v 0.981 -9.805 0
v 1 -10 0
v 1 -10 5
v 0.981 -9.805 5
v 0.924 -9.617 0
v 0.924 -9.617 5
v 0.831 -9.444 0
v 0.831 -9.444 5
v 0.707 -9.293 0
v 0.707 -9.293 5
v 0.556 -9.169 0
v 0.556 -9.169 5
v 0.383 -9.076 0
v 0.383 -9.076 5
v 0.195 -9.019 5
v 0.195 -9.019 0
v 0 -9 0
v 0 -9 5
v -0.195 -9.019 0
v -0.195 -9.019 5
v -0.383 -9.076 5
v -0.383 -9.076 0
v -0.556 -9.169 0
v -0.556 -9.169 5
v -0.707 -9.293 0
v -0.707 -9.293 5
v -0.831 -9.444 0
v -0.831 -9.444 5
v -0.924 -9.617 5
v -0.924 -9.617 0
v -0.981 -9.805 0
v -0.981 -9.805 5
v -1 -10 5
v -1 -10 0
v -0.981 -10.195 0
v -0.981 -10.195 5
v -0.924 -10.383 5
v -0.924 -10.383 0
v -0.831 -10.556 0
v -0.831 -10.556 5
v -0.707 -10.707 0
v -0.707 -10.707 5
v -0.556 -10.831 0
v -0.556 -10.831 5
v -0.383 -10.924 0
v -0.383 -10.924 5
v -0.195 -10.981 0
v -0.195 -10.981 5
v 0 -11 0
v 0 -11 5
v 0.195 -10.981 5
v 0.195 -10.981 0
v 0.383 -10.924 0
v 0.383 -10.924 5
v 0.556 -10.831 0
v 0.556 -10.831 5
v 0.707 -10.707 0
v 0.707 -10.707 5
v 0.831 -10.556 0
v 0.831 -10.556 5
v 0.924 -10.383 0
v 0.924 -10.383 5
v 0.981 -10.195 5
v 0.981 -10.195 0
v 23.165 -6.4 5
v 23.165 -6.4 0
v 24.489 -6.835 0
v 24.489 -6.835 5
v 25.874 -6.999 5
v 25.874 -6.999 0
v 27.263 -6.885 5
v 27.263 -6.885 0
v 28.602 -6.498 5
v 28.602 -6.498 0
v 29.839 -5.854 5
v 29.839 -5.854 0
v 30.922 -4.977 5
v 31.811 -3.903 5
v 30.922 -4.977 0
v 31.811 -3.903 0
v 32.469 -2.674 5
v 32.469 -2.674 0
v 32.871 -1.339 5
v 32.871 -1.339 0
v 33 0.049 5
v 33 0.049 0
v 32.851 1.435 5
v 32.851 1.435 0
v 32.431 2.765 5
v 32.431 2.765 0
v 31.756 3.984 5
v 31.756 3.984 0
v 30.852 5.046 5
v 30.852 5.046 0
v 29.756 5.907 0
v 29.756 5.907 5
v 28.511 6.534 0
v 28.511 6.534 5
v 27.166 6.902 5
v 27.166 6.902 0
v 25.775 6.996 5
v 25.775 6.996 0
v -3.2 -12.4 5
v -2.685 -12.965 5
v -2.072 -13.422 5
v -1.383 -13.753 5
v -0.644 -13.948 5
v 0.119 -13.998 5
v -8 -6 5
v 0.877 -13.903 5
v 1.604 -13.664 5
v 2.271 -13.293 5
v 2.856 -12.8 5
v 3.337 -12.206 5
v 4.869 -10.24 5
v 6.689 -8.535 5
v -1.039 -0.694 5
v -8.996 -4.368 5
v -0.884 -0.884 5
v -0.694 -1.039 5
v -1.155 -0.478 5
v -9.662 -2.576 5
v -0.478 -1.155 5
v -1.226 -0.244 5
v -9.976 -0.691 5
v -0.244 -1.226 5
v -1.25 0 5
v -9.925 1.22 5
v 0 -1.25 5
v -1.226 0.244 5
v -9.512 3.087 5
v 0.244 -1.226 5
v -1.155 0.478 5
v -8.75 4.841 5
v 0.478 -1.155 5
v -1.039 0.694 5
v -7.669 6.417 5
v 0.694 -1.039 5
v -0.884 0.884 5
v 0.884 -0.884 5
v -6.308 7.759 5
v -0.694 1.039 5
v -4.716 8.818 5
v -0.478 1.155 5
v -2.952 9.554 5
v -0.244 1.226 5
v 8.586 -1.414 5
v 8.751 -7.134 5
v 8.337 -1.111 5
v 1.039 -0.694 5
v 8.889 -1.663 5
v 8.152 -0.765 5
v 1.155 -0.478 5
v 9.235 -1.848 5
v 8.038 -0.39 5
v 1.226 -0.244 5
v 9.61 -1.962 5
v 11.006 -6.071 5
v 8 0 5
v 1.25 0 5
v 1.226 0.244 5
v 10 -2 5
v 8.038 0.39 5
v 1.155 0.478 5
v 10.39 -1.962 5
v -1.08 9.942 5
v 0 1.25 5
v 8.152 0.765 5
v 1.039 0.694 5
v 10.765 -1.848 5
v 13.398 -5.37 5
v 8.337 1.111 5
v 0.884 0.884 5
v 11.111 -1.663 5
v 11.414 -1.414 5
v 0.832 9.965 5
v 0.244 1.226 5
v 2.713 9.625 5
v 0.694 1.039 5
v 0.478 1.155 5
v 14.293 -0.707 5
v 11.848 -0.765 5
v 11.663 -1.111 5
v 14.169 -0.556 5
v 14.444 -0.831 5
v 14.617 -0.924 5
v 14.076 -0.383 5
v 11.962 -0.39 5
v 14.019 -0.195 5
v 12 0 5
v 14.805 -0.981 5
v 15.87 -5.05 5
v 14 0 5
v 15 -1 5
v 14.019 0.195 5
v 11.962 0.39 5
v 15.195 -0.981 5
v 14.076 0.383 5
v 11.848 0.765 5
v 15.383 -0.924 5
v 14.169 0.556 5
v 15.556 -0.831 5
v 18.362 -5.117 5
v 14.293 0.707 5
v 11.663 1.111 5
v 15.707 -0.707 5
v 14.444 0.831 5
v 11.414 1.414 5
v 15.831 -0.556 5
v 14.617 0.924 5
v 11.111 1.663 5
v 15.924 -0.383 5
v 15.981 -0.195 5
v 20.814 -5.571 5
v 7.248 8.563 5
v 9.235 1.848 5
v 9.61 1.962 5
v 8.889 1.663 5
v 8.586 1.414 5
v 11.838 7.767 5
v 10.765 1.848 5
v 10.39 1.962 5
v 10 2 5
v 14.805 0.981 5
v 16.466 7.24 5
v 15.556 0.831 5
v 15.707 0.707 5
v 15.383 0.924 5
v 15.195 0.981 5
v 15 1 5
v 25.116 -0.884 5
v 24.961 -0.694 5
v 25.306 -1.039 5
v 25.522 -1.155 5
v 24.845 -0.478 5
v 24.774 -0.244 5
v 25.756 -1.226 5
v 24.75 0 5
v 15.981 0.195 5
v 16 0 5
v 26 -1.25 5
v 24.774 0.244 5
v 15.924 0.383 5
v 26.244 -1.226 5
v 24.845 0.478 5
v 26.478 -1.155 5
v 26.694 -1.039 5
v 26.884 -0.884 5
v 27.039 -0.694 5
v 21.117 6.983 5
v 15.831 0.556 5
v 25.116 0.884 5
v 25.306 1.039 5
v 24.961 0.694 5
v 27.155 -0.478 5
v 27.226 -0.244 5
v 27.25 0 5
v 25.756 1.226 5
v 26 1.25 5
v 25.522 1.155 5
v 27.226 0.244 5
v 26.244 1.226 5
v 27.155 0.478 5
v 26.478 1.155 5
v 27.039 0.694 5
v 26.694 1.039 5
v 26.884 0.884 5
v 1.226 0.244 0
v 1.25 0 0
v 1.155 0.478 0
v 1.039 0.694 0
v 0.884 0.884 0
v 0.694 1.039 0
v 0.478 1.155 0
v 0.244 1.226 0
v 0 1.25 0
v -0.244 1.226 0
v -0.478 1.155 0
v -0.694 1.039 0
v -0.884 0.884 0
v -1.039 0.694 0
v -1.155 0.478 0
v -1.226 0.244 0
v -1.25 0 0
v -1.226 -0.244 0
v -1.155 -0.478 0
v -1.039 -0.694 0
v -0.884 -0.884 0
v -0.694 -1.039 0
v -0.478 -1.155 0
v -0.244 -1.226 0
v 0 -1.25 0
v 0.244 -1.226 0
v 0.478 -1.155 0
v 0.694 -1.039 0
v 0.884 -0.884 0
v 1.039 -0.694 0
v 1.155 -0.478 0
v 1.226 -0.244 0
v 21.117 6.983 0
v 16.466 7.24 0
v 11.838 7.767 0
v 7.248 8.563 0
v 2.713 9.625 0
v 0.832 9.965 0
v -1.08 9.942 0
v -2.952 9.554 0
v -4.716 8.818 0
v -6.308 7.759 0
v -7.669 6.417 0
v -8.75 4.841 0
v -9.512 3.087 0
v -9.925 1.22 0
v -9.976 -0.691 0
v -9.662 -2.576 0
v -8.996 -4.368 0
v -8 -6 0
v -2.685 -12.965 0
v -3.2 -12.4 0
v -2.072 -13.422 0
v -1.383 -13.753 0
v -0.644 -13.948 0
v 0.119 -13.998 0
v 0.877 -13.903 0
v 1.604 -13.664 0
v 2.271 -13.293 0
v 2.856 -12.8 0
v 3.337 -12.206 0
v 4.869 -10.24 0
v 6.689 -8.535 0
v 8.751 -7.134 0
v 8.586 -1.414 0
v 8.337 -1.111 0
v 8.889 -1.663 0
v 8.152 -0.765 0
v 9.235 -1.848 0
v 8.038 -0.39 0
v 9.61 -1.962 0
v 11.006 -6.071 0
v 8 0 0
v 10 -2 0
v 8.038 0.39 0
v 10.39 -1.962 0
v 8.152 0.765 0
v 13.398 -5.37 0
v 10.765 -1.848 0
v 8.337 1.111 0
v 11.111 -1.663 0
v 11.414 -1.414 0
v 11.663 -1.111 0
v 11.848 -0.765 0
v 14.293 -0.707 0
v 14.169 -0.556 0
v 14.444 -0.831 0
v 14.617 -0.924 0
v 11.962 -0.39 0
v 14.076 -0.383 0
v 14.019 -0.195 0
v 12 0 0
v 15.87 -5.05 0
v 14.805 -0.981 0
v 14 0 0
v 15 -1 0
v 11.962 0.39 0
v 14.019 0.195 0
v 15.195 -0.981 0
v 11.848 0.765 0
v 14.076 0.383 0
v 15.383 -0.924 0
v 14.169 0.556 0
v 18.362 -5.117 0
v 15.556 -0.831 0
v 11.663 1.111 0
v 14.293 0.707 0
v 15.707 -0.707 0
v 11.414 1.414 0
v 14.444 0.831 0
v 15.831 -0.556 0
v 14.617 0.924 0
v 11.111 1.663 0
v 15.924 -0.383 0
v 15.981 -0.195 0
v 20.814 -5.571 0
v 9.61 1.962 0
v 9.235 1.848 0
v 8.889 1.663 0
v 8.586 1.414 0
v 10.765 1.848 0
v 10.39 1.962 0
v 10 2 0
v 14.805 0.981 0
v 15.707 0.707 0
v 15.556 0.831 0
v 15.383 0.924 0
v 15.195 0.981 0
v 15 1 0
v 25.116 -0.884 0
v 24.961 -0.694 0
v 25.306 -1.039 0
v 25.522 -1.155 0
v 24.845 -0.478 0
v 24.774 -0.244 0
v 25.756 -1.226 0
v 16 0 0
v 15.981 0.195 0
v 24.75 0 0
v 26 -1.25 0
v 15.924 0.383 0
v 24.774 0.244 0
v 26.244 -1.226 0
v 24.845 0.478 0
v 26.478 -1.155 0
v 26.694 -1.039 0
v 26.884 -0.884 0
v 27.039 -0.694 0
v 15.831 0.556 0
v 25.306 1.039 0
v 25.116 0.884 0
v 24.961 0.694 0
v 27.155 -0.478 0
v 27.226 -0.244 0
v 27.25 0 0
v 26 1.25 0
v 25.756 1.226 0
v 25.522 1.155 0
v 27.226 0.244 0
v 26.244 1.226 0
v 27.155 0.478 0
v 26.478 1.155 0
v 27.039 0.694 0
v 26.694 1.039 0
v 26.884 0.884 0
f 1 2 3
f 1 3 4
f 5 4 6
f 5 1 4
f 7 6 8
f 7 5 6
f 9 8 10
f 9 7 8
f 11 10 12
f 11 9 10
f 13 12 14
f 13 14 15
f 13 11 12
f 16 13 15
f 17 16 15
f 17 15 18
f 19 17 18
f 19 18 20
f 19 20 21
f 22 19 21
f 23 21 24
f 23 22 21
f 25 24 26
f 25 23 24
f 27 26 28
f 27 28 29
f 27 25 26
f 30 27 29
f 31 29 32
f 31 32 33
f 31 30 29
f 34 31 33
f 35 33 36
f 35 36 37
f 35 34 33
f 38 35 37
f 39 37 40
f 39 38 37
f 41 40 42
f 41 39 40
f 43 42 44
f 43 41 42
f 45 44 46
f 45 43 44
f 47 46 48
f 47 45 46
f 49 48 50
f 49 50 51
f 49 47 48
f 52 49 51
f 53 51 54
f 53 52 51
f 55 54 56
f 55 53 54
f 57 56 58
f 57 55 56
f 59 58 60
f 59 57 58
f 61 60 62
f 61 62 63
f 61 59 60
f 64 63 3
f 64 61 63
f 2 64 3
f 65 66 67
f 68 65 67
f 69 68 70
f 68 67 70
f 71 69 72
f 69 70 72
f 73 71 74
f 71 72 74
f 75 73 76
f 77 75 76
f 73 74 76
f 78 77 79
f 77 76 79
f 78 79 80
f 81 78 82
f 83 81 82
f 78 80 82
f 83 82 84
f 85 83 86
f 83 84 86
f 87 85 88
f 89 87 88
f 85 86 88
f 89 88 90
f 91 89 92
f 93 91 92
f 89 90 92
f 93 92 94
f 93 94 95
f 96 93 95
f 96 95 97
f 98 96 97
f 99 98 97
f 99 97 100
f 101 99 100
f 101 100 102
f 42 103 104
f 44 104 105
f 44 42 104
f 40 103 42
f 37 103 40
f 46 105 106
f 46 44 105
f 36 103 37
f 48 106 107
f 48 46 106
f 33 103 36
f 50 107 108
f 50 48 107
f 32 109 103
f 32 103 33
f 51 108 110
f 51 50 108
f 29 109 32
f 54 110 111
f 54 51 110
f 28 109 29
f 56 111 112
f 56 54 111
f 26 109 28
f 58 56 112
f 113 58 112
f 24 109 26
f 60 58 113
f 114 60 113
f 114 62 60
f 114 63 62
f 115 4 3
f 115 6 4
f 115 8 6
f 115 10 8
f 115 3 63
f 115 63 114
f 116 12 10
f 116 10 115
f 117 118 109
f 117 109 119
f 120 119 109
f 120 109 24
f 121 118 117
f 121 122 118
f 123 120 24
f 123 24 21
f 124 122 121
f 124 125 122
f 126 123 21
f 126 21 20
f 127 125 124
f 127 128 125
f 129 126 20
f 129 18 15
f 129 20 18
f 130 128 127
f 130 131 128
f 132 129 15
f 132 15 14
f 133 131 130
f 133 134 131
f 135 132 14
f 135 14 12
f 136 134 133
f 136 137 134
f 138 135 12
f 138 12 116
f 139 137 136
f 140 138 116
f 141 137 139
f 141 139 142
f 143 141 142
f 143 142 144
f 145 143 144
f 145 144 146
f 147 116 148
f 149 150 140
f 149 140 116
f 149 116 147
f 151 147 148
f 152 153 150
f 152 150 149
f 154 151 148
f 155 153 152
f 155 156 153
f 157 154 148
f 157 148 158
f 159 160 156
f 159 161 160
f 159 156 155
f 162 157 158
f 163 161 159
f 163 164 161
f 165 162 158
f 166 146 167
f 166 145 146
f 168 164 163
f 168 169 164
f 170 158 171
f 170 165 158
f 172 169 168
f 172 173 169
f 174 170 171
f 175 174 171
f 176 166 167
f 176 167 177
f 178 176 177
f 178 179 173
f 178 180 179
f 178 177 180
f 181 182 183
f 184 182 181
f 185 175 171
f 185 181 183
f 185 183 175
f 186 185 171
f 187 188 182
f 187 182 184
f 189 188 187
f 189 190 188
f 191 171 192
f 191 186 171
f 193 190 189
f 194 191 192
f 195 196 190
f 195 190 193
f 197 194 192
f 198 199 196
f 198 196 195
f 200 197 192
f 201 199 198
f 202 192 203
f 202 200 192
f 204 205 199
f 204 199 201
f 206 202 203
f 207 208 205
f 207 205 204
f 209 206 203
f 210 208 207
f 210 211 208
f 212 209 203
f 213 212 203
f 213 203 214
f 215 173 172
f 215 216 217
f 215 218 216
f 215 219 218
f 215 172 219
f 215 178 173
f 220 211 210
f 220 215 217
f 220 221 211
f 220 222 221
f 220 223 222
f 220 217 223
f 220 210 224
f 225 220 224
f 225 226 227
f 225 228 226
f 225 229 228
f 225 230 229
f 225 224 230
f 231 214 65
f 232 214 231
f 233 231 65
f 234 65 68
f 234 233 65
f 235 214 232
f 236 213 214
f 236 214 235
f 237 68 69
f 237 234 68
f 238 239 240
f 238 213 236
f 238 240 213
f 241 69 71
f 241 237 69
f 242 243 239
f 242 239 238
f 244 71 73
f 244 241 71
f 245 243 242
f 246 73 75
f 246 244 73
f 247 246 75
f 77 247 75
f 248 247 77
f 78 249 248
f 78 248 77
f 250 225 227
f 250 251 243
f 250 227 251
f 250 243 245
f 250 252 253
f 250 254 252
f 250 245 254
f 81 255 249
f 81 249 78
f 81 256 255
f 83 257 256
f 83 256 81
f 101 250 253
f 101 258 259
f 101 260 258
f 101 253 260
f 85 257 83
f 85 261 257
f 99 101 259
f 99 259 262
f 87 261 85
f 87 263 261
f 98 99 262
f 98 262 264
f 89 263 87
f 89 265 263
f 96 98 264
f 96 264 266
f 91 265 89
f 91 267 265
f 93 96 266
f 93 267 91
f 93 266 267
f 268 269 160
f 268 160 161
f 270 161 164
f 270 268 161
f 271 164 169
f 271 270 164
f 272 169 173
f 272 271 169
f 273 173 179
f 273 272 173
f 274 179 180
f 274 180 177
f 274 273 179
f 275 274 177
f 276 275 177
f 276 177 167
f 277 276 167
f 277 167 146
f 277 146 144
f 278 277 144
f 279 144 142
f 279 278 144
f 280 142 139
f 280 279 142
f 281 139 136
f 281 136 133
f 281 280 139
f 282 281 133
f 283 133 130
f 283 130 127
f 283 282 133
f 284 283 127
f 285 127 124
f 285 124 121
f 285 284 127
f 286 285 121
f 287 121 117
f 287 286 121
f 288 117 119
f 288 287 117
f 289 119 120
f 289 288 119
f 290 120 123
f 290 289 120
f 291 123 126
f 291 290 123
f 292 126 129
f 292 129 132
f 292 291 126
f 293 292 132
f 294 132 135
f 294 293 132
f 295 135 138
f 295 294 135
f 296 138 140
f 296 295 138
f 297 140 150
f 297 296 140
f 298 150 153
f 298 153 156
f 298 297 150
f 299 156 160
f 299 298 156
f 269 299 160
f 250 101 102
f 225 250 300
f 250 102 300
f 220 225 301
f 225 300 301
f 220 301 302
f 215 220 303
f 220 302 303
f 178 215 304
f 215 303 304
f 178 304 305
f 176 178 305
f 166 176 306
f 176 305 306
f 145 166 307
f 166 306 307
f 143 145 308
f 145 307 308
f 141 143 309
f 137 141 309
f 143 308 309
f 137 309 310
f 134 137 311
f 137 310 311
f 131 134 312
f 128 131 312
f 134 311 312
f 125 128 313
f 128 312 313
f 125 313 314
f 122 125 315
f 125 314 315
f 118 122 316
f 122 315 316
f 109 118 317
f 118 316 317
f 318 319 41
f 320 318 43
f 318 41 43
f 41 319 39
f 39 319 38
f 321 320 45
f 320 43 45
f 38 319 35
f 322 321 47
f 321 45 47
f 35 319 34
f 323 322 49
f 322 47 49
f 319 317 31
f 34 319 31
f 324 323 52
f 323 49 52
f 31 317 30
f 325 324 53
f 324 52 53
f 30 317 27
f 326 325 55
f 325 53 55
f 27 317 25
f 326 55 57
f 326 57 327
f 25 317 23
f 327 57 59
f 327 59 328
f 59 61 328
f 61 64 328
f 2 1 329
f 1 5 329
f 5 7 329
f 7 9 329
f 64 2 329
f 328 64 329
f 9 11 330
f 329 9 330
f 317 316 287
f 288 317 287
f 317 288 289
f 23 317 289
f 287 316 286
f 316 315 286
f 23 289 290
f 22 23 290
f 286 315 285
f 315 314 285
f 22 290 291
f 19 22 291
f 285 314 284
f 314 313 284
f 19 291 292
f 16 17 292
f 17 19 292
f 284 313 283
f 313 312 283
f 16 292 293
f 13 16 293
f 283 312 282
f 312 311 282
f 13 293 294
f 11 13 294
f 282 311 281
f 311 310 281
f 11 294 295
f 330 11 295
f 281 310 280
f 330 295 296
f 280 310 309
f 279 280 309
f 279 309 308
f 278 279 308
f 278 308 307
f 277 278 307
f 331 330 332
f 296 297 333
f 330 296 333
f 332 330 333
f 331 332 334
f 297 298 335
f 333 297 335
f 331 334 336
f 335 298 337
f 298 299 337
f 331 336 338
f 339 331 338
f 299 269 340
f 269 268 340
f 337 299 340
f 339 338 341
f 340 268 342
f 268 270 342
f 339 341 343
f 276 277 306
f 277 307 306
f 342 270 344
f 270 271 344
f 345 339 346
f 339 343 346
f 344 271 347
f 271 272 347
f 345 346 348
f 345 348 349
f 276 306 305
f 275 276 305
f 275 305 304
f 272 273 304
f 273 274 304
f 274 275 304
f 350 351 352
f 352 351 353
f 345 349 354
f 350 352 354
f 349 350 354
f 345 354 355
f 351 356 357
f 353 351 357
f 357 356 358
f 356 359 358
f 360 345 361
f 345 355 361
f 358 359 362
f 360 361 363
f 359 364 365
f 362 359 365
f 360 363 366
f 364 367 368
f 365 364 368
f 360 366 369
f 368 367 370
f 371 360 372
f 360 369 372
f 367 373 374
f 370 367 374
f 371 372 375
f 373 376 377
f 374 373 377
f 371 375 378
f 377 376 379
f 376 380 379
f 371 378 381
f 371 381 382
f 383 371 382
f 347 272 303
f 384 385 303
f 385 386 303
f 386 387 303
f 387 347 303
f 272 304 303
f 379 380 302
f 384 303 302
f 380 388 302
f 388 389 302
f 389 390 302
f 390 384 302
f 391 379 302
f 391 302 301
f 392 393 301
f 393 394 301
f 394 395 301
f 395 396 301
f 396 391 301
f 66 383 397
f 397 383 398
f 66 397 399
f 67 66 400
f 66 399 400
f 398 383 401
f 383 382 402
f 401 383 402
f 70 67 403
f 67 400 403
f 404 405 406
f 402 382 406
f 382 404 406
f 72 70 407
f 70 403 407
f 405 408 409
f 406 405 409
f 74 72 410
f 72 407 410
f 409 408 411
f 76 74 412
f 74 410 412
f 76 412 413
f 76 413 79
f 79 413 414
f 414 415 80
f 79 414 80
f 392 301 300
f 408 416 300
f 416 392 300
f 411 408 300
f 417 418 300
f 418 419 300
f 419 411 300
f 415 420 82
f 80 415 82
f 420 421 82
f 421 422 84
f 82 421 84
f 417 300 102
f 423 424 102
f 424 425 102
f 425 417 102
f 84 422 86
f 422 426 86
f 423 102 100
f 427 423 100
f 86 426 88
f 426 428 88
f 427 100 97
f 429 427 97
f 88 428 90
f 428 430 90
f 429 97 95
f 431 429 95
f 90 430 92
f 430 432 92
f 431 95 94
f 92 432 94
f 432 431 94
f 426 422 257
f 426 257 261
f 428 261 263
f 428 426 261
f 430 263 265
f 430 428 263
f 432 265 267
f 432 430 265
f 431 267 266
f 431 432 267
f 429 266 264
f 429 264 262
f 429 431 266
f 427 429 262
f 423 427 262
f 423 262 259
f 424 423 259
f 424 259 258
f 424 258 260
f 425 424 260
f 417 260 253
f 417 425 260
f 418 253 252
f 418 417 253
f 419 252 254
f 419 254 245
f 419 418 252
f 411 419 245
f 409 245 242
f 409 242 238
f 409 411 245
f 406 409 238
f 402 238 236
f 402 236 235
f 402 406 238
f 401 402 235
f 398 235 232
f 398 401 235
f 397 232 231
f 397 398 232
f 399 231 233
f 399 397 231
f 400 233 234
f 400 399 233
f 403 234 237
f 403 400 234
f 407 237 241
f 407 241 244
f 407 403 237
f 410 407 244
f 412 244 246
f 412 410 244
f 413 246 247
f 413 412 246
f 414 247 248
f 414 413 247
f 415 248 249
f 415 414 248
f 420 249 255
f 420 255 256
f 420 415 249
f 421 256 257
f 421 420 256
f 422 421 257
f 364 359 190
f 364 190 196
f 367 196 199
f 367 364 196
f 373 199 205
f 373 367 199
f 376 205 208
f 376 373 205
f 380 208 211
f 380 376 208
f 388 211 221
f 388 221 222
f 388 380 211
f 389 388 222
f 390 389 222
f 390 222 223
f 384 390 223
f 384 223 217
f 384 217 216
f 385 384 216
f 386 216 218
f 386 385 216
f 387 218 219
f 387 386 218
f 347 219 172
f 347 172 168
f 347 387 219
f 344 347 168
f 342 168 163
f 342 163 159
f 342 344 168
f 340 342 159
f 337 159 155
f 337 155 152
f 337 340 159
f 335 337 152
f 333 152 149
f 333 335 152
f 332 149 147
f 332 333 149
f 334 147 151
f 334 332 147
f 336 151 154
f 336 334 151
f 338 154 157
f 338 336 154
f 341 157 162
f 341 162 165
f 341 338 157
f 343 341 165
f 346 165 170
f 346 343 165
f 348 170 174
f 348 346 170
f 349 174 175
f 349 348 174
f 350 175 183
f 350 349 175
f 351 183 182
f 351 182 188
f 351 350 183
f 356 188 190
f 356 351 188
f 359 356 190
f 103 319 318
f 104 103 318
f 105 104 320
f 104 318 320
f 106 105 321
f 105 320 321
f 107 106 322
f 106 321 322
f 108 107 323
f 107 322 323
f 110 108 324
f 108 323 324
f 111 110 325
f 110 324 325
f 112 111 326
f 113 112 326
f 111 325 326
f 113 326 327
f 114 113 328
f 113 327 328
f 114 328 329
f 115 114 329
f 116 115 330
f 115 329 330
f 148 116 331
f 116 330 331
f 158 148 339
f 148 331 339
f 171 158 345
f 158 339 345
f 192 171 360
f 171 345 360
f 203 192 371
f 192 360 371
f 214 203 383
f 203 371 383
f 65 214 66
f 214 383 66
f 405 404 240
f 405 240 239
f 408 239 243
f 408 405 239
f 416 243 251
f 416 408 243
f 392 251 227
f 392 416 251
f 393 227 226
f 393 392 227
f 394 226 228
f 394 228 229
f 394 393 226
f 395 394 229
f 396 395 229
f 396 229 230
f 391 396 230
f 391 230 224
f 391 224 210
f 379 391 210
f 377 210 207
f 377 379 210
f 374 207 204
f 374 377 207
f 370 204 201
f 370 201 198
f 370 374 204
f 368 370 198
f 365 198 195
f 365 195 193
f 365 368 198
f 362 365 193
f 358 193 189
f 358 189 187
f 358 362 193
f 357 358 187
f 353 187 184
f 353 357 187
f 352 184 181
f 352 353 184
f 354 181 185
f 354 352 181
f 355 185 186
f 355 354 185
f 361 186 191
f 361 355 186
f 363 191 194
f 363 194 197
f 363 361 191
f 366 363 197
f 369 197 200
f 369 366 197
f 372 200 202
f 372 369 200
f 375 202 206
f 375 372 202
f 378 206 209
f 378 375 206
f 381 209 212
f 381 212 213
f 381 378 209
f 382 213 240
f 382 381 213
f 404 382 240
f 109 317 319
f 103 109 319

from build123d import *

# Parameters (mm, degrees)
SKETCH1_R           = 1.25
SKETCH1_R_2         = 2
SKETCH1_R_3         = 1
BOSS_EXTRUDE1_DEPTH = 5


with BuildPart() as part:
    # Sketch1 → Boss-Extrude1 (new body)
    with BuildSketch(Plane.XY):
        with BuildLine():
            Line((-8, -6), (-3.2, -12.4))
            ThreePointArc((-3.2, -12.4), (0.118790152, -13.998235723), (3.336840869, -12.205786258))
            ThreePointArc((3.336840869, -12.205786258), (12.188123784, -5.673630591), (23.164757844, -6.400109524))
            ThreePointArc((23.164757844, -6.400109524), (32.870759027, -1.338906415), (25.775337581, 6.996393842))
            ThreePointArc((25.775337581, 6.996393842), (14.14827012, 7.469801361), (2.712885779, 9.624980559))
            ThreePointArc((2.712885779, 9.624980559), (-8.247629875, 5.654785711), (-8, -6))
        make_face()
        Circle(SKETCH1_R, mode=Mode.SUBTRACT)
        with Locations((26, 0)):
            Circle(SKETCH1_R, mode=Mode.SUBTRACT)
        with Locations((10, 0)):
            Circle(SKETCH1_R_2, mode=Mode.SUBTRACT)
        with Locations((15, 0)):
            Circle(SKETCH1_R_3, mode=Mode.SUBTRACT)
        with Locations((0, -10)):
            Circle(SKETCH1_R_3, mode=Mode.SUBTRACT)
    extrude(amount=BOSS_EXTRUDE1_DEPTH)


solid = part.part
